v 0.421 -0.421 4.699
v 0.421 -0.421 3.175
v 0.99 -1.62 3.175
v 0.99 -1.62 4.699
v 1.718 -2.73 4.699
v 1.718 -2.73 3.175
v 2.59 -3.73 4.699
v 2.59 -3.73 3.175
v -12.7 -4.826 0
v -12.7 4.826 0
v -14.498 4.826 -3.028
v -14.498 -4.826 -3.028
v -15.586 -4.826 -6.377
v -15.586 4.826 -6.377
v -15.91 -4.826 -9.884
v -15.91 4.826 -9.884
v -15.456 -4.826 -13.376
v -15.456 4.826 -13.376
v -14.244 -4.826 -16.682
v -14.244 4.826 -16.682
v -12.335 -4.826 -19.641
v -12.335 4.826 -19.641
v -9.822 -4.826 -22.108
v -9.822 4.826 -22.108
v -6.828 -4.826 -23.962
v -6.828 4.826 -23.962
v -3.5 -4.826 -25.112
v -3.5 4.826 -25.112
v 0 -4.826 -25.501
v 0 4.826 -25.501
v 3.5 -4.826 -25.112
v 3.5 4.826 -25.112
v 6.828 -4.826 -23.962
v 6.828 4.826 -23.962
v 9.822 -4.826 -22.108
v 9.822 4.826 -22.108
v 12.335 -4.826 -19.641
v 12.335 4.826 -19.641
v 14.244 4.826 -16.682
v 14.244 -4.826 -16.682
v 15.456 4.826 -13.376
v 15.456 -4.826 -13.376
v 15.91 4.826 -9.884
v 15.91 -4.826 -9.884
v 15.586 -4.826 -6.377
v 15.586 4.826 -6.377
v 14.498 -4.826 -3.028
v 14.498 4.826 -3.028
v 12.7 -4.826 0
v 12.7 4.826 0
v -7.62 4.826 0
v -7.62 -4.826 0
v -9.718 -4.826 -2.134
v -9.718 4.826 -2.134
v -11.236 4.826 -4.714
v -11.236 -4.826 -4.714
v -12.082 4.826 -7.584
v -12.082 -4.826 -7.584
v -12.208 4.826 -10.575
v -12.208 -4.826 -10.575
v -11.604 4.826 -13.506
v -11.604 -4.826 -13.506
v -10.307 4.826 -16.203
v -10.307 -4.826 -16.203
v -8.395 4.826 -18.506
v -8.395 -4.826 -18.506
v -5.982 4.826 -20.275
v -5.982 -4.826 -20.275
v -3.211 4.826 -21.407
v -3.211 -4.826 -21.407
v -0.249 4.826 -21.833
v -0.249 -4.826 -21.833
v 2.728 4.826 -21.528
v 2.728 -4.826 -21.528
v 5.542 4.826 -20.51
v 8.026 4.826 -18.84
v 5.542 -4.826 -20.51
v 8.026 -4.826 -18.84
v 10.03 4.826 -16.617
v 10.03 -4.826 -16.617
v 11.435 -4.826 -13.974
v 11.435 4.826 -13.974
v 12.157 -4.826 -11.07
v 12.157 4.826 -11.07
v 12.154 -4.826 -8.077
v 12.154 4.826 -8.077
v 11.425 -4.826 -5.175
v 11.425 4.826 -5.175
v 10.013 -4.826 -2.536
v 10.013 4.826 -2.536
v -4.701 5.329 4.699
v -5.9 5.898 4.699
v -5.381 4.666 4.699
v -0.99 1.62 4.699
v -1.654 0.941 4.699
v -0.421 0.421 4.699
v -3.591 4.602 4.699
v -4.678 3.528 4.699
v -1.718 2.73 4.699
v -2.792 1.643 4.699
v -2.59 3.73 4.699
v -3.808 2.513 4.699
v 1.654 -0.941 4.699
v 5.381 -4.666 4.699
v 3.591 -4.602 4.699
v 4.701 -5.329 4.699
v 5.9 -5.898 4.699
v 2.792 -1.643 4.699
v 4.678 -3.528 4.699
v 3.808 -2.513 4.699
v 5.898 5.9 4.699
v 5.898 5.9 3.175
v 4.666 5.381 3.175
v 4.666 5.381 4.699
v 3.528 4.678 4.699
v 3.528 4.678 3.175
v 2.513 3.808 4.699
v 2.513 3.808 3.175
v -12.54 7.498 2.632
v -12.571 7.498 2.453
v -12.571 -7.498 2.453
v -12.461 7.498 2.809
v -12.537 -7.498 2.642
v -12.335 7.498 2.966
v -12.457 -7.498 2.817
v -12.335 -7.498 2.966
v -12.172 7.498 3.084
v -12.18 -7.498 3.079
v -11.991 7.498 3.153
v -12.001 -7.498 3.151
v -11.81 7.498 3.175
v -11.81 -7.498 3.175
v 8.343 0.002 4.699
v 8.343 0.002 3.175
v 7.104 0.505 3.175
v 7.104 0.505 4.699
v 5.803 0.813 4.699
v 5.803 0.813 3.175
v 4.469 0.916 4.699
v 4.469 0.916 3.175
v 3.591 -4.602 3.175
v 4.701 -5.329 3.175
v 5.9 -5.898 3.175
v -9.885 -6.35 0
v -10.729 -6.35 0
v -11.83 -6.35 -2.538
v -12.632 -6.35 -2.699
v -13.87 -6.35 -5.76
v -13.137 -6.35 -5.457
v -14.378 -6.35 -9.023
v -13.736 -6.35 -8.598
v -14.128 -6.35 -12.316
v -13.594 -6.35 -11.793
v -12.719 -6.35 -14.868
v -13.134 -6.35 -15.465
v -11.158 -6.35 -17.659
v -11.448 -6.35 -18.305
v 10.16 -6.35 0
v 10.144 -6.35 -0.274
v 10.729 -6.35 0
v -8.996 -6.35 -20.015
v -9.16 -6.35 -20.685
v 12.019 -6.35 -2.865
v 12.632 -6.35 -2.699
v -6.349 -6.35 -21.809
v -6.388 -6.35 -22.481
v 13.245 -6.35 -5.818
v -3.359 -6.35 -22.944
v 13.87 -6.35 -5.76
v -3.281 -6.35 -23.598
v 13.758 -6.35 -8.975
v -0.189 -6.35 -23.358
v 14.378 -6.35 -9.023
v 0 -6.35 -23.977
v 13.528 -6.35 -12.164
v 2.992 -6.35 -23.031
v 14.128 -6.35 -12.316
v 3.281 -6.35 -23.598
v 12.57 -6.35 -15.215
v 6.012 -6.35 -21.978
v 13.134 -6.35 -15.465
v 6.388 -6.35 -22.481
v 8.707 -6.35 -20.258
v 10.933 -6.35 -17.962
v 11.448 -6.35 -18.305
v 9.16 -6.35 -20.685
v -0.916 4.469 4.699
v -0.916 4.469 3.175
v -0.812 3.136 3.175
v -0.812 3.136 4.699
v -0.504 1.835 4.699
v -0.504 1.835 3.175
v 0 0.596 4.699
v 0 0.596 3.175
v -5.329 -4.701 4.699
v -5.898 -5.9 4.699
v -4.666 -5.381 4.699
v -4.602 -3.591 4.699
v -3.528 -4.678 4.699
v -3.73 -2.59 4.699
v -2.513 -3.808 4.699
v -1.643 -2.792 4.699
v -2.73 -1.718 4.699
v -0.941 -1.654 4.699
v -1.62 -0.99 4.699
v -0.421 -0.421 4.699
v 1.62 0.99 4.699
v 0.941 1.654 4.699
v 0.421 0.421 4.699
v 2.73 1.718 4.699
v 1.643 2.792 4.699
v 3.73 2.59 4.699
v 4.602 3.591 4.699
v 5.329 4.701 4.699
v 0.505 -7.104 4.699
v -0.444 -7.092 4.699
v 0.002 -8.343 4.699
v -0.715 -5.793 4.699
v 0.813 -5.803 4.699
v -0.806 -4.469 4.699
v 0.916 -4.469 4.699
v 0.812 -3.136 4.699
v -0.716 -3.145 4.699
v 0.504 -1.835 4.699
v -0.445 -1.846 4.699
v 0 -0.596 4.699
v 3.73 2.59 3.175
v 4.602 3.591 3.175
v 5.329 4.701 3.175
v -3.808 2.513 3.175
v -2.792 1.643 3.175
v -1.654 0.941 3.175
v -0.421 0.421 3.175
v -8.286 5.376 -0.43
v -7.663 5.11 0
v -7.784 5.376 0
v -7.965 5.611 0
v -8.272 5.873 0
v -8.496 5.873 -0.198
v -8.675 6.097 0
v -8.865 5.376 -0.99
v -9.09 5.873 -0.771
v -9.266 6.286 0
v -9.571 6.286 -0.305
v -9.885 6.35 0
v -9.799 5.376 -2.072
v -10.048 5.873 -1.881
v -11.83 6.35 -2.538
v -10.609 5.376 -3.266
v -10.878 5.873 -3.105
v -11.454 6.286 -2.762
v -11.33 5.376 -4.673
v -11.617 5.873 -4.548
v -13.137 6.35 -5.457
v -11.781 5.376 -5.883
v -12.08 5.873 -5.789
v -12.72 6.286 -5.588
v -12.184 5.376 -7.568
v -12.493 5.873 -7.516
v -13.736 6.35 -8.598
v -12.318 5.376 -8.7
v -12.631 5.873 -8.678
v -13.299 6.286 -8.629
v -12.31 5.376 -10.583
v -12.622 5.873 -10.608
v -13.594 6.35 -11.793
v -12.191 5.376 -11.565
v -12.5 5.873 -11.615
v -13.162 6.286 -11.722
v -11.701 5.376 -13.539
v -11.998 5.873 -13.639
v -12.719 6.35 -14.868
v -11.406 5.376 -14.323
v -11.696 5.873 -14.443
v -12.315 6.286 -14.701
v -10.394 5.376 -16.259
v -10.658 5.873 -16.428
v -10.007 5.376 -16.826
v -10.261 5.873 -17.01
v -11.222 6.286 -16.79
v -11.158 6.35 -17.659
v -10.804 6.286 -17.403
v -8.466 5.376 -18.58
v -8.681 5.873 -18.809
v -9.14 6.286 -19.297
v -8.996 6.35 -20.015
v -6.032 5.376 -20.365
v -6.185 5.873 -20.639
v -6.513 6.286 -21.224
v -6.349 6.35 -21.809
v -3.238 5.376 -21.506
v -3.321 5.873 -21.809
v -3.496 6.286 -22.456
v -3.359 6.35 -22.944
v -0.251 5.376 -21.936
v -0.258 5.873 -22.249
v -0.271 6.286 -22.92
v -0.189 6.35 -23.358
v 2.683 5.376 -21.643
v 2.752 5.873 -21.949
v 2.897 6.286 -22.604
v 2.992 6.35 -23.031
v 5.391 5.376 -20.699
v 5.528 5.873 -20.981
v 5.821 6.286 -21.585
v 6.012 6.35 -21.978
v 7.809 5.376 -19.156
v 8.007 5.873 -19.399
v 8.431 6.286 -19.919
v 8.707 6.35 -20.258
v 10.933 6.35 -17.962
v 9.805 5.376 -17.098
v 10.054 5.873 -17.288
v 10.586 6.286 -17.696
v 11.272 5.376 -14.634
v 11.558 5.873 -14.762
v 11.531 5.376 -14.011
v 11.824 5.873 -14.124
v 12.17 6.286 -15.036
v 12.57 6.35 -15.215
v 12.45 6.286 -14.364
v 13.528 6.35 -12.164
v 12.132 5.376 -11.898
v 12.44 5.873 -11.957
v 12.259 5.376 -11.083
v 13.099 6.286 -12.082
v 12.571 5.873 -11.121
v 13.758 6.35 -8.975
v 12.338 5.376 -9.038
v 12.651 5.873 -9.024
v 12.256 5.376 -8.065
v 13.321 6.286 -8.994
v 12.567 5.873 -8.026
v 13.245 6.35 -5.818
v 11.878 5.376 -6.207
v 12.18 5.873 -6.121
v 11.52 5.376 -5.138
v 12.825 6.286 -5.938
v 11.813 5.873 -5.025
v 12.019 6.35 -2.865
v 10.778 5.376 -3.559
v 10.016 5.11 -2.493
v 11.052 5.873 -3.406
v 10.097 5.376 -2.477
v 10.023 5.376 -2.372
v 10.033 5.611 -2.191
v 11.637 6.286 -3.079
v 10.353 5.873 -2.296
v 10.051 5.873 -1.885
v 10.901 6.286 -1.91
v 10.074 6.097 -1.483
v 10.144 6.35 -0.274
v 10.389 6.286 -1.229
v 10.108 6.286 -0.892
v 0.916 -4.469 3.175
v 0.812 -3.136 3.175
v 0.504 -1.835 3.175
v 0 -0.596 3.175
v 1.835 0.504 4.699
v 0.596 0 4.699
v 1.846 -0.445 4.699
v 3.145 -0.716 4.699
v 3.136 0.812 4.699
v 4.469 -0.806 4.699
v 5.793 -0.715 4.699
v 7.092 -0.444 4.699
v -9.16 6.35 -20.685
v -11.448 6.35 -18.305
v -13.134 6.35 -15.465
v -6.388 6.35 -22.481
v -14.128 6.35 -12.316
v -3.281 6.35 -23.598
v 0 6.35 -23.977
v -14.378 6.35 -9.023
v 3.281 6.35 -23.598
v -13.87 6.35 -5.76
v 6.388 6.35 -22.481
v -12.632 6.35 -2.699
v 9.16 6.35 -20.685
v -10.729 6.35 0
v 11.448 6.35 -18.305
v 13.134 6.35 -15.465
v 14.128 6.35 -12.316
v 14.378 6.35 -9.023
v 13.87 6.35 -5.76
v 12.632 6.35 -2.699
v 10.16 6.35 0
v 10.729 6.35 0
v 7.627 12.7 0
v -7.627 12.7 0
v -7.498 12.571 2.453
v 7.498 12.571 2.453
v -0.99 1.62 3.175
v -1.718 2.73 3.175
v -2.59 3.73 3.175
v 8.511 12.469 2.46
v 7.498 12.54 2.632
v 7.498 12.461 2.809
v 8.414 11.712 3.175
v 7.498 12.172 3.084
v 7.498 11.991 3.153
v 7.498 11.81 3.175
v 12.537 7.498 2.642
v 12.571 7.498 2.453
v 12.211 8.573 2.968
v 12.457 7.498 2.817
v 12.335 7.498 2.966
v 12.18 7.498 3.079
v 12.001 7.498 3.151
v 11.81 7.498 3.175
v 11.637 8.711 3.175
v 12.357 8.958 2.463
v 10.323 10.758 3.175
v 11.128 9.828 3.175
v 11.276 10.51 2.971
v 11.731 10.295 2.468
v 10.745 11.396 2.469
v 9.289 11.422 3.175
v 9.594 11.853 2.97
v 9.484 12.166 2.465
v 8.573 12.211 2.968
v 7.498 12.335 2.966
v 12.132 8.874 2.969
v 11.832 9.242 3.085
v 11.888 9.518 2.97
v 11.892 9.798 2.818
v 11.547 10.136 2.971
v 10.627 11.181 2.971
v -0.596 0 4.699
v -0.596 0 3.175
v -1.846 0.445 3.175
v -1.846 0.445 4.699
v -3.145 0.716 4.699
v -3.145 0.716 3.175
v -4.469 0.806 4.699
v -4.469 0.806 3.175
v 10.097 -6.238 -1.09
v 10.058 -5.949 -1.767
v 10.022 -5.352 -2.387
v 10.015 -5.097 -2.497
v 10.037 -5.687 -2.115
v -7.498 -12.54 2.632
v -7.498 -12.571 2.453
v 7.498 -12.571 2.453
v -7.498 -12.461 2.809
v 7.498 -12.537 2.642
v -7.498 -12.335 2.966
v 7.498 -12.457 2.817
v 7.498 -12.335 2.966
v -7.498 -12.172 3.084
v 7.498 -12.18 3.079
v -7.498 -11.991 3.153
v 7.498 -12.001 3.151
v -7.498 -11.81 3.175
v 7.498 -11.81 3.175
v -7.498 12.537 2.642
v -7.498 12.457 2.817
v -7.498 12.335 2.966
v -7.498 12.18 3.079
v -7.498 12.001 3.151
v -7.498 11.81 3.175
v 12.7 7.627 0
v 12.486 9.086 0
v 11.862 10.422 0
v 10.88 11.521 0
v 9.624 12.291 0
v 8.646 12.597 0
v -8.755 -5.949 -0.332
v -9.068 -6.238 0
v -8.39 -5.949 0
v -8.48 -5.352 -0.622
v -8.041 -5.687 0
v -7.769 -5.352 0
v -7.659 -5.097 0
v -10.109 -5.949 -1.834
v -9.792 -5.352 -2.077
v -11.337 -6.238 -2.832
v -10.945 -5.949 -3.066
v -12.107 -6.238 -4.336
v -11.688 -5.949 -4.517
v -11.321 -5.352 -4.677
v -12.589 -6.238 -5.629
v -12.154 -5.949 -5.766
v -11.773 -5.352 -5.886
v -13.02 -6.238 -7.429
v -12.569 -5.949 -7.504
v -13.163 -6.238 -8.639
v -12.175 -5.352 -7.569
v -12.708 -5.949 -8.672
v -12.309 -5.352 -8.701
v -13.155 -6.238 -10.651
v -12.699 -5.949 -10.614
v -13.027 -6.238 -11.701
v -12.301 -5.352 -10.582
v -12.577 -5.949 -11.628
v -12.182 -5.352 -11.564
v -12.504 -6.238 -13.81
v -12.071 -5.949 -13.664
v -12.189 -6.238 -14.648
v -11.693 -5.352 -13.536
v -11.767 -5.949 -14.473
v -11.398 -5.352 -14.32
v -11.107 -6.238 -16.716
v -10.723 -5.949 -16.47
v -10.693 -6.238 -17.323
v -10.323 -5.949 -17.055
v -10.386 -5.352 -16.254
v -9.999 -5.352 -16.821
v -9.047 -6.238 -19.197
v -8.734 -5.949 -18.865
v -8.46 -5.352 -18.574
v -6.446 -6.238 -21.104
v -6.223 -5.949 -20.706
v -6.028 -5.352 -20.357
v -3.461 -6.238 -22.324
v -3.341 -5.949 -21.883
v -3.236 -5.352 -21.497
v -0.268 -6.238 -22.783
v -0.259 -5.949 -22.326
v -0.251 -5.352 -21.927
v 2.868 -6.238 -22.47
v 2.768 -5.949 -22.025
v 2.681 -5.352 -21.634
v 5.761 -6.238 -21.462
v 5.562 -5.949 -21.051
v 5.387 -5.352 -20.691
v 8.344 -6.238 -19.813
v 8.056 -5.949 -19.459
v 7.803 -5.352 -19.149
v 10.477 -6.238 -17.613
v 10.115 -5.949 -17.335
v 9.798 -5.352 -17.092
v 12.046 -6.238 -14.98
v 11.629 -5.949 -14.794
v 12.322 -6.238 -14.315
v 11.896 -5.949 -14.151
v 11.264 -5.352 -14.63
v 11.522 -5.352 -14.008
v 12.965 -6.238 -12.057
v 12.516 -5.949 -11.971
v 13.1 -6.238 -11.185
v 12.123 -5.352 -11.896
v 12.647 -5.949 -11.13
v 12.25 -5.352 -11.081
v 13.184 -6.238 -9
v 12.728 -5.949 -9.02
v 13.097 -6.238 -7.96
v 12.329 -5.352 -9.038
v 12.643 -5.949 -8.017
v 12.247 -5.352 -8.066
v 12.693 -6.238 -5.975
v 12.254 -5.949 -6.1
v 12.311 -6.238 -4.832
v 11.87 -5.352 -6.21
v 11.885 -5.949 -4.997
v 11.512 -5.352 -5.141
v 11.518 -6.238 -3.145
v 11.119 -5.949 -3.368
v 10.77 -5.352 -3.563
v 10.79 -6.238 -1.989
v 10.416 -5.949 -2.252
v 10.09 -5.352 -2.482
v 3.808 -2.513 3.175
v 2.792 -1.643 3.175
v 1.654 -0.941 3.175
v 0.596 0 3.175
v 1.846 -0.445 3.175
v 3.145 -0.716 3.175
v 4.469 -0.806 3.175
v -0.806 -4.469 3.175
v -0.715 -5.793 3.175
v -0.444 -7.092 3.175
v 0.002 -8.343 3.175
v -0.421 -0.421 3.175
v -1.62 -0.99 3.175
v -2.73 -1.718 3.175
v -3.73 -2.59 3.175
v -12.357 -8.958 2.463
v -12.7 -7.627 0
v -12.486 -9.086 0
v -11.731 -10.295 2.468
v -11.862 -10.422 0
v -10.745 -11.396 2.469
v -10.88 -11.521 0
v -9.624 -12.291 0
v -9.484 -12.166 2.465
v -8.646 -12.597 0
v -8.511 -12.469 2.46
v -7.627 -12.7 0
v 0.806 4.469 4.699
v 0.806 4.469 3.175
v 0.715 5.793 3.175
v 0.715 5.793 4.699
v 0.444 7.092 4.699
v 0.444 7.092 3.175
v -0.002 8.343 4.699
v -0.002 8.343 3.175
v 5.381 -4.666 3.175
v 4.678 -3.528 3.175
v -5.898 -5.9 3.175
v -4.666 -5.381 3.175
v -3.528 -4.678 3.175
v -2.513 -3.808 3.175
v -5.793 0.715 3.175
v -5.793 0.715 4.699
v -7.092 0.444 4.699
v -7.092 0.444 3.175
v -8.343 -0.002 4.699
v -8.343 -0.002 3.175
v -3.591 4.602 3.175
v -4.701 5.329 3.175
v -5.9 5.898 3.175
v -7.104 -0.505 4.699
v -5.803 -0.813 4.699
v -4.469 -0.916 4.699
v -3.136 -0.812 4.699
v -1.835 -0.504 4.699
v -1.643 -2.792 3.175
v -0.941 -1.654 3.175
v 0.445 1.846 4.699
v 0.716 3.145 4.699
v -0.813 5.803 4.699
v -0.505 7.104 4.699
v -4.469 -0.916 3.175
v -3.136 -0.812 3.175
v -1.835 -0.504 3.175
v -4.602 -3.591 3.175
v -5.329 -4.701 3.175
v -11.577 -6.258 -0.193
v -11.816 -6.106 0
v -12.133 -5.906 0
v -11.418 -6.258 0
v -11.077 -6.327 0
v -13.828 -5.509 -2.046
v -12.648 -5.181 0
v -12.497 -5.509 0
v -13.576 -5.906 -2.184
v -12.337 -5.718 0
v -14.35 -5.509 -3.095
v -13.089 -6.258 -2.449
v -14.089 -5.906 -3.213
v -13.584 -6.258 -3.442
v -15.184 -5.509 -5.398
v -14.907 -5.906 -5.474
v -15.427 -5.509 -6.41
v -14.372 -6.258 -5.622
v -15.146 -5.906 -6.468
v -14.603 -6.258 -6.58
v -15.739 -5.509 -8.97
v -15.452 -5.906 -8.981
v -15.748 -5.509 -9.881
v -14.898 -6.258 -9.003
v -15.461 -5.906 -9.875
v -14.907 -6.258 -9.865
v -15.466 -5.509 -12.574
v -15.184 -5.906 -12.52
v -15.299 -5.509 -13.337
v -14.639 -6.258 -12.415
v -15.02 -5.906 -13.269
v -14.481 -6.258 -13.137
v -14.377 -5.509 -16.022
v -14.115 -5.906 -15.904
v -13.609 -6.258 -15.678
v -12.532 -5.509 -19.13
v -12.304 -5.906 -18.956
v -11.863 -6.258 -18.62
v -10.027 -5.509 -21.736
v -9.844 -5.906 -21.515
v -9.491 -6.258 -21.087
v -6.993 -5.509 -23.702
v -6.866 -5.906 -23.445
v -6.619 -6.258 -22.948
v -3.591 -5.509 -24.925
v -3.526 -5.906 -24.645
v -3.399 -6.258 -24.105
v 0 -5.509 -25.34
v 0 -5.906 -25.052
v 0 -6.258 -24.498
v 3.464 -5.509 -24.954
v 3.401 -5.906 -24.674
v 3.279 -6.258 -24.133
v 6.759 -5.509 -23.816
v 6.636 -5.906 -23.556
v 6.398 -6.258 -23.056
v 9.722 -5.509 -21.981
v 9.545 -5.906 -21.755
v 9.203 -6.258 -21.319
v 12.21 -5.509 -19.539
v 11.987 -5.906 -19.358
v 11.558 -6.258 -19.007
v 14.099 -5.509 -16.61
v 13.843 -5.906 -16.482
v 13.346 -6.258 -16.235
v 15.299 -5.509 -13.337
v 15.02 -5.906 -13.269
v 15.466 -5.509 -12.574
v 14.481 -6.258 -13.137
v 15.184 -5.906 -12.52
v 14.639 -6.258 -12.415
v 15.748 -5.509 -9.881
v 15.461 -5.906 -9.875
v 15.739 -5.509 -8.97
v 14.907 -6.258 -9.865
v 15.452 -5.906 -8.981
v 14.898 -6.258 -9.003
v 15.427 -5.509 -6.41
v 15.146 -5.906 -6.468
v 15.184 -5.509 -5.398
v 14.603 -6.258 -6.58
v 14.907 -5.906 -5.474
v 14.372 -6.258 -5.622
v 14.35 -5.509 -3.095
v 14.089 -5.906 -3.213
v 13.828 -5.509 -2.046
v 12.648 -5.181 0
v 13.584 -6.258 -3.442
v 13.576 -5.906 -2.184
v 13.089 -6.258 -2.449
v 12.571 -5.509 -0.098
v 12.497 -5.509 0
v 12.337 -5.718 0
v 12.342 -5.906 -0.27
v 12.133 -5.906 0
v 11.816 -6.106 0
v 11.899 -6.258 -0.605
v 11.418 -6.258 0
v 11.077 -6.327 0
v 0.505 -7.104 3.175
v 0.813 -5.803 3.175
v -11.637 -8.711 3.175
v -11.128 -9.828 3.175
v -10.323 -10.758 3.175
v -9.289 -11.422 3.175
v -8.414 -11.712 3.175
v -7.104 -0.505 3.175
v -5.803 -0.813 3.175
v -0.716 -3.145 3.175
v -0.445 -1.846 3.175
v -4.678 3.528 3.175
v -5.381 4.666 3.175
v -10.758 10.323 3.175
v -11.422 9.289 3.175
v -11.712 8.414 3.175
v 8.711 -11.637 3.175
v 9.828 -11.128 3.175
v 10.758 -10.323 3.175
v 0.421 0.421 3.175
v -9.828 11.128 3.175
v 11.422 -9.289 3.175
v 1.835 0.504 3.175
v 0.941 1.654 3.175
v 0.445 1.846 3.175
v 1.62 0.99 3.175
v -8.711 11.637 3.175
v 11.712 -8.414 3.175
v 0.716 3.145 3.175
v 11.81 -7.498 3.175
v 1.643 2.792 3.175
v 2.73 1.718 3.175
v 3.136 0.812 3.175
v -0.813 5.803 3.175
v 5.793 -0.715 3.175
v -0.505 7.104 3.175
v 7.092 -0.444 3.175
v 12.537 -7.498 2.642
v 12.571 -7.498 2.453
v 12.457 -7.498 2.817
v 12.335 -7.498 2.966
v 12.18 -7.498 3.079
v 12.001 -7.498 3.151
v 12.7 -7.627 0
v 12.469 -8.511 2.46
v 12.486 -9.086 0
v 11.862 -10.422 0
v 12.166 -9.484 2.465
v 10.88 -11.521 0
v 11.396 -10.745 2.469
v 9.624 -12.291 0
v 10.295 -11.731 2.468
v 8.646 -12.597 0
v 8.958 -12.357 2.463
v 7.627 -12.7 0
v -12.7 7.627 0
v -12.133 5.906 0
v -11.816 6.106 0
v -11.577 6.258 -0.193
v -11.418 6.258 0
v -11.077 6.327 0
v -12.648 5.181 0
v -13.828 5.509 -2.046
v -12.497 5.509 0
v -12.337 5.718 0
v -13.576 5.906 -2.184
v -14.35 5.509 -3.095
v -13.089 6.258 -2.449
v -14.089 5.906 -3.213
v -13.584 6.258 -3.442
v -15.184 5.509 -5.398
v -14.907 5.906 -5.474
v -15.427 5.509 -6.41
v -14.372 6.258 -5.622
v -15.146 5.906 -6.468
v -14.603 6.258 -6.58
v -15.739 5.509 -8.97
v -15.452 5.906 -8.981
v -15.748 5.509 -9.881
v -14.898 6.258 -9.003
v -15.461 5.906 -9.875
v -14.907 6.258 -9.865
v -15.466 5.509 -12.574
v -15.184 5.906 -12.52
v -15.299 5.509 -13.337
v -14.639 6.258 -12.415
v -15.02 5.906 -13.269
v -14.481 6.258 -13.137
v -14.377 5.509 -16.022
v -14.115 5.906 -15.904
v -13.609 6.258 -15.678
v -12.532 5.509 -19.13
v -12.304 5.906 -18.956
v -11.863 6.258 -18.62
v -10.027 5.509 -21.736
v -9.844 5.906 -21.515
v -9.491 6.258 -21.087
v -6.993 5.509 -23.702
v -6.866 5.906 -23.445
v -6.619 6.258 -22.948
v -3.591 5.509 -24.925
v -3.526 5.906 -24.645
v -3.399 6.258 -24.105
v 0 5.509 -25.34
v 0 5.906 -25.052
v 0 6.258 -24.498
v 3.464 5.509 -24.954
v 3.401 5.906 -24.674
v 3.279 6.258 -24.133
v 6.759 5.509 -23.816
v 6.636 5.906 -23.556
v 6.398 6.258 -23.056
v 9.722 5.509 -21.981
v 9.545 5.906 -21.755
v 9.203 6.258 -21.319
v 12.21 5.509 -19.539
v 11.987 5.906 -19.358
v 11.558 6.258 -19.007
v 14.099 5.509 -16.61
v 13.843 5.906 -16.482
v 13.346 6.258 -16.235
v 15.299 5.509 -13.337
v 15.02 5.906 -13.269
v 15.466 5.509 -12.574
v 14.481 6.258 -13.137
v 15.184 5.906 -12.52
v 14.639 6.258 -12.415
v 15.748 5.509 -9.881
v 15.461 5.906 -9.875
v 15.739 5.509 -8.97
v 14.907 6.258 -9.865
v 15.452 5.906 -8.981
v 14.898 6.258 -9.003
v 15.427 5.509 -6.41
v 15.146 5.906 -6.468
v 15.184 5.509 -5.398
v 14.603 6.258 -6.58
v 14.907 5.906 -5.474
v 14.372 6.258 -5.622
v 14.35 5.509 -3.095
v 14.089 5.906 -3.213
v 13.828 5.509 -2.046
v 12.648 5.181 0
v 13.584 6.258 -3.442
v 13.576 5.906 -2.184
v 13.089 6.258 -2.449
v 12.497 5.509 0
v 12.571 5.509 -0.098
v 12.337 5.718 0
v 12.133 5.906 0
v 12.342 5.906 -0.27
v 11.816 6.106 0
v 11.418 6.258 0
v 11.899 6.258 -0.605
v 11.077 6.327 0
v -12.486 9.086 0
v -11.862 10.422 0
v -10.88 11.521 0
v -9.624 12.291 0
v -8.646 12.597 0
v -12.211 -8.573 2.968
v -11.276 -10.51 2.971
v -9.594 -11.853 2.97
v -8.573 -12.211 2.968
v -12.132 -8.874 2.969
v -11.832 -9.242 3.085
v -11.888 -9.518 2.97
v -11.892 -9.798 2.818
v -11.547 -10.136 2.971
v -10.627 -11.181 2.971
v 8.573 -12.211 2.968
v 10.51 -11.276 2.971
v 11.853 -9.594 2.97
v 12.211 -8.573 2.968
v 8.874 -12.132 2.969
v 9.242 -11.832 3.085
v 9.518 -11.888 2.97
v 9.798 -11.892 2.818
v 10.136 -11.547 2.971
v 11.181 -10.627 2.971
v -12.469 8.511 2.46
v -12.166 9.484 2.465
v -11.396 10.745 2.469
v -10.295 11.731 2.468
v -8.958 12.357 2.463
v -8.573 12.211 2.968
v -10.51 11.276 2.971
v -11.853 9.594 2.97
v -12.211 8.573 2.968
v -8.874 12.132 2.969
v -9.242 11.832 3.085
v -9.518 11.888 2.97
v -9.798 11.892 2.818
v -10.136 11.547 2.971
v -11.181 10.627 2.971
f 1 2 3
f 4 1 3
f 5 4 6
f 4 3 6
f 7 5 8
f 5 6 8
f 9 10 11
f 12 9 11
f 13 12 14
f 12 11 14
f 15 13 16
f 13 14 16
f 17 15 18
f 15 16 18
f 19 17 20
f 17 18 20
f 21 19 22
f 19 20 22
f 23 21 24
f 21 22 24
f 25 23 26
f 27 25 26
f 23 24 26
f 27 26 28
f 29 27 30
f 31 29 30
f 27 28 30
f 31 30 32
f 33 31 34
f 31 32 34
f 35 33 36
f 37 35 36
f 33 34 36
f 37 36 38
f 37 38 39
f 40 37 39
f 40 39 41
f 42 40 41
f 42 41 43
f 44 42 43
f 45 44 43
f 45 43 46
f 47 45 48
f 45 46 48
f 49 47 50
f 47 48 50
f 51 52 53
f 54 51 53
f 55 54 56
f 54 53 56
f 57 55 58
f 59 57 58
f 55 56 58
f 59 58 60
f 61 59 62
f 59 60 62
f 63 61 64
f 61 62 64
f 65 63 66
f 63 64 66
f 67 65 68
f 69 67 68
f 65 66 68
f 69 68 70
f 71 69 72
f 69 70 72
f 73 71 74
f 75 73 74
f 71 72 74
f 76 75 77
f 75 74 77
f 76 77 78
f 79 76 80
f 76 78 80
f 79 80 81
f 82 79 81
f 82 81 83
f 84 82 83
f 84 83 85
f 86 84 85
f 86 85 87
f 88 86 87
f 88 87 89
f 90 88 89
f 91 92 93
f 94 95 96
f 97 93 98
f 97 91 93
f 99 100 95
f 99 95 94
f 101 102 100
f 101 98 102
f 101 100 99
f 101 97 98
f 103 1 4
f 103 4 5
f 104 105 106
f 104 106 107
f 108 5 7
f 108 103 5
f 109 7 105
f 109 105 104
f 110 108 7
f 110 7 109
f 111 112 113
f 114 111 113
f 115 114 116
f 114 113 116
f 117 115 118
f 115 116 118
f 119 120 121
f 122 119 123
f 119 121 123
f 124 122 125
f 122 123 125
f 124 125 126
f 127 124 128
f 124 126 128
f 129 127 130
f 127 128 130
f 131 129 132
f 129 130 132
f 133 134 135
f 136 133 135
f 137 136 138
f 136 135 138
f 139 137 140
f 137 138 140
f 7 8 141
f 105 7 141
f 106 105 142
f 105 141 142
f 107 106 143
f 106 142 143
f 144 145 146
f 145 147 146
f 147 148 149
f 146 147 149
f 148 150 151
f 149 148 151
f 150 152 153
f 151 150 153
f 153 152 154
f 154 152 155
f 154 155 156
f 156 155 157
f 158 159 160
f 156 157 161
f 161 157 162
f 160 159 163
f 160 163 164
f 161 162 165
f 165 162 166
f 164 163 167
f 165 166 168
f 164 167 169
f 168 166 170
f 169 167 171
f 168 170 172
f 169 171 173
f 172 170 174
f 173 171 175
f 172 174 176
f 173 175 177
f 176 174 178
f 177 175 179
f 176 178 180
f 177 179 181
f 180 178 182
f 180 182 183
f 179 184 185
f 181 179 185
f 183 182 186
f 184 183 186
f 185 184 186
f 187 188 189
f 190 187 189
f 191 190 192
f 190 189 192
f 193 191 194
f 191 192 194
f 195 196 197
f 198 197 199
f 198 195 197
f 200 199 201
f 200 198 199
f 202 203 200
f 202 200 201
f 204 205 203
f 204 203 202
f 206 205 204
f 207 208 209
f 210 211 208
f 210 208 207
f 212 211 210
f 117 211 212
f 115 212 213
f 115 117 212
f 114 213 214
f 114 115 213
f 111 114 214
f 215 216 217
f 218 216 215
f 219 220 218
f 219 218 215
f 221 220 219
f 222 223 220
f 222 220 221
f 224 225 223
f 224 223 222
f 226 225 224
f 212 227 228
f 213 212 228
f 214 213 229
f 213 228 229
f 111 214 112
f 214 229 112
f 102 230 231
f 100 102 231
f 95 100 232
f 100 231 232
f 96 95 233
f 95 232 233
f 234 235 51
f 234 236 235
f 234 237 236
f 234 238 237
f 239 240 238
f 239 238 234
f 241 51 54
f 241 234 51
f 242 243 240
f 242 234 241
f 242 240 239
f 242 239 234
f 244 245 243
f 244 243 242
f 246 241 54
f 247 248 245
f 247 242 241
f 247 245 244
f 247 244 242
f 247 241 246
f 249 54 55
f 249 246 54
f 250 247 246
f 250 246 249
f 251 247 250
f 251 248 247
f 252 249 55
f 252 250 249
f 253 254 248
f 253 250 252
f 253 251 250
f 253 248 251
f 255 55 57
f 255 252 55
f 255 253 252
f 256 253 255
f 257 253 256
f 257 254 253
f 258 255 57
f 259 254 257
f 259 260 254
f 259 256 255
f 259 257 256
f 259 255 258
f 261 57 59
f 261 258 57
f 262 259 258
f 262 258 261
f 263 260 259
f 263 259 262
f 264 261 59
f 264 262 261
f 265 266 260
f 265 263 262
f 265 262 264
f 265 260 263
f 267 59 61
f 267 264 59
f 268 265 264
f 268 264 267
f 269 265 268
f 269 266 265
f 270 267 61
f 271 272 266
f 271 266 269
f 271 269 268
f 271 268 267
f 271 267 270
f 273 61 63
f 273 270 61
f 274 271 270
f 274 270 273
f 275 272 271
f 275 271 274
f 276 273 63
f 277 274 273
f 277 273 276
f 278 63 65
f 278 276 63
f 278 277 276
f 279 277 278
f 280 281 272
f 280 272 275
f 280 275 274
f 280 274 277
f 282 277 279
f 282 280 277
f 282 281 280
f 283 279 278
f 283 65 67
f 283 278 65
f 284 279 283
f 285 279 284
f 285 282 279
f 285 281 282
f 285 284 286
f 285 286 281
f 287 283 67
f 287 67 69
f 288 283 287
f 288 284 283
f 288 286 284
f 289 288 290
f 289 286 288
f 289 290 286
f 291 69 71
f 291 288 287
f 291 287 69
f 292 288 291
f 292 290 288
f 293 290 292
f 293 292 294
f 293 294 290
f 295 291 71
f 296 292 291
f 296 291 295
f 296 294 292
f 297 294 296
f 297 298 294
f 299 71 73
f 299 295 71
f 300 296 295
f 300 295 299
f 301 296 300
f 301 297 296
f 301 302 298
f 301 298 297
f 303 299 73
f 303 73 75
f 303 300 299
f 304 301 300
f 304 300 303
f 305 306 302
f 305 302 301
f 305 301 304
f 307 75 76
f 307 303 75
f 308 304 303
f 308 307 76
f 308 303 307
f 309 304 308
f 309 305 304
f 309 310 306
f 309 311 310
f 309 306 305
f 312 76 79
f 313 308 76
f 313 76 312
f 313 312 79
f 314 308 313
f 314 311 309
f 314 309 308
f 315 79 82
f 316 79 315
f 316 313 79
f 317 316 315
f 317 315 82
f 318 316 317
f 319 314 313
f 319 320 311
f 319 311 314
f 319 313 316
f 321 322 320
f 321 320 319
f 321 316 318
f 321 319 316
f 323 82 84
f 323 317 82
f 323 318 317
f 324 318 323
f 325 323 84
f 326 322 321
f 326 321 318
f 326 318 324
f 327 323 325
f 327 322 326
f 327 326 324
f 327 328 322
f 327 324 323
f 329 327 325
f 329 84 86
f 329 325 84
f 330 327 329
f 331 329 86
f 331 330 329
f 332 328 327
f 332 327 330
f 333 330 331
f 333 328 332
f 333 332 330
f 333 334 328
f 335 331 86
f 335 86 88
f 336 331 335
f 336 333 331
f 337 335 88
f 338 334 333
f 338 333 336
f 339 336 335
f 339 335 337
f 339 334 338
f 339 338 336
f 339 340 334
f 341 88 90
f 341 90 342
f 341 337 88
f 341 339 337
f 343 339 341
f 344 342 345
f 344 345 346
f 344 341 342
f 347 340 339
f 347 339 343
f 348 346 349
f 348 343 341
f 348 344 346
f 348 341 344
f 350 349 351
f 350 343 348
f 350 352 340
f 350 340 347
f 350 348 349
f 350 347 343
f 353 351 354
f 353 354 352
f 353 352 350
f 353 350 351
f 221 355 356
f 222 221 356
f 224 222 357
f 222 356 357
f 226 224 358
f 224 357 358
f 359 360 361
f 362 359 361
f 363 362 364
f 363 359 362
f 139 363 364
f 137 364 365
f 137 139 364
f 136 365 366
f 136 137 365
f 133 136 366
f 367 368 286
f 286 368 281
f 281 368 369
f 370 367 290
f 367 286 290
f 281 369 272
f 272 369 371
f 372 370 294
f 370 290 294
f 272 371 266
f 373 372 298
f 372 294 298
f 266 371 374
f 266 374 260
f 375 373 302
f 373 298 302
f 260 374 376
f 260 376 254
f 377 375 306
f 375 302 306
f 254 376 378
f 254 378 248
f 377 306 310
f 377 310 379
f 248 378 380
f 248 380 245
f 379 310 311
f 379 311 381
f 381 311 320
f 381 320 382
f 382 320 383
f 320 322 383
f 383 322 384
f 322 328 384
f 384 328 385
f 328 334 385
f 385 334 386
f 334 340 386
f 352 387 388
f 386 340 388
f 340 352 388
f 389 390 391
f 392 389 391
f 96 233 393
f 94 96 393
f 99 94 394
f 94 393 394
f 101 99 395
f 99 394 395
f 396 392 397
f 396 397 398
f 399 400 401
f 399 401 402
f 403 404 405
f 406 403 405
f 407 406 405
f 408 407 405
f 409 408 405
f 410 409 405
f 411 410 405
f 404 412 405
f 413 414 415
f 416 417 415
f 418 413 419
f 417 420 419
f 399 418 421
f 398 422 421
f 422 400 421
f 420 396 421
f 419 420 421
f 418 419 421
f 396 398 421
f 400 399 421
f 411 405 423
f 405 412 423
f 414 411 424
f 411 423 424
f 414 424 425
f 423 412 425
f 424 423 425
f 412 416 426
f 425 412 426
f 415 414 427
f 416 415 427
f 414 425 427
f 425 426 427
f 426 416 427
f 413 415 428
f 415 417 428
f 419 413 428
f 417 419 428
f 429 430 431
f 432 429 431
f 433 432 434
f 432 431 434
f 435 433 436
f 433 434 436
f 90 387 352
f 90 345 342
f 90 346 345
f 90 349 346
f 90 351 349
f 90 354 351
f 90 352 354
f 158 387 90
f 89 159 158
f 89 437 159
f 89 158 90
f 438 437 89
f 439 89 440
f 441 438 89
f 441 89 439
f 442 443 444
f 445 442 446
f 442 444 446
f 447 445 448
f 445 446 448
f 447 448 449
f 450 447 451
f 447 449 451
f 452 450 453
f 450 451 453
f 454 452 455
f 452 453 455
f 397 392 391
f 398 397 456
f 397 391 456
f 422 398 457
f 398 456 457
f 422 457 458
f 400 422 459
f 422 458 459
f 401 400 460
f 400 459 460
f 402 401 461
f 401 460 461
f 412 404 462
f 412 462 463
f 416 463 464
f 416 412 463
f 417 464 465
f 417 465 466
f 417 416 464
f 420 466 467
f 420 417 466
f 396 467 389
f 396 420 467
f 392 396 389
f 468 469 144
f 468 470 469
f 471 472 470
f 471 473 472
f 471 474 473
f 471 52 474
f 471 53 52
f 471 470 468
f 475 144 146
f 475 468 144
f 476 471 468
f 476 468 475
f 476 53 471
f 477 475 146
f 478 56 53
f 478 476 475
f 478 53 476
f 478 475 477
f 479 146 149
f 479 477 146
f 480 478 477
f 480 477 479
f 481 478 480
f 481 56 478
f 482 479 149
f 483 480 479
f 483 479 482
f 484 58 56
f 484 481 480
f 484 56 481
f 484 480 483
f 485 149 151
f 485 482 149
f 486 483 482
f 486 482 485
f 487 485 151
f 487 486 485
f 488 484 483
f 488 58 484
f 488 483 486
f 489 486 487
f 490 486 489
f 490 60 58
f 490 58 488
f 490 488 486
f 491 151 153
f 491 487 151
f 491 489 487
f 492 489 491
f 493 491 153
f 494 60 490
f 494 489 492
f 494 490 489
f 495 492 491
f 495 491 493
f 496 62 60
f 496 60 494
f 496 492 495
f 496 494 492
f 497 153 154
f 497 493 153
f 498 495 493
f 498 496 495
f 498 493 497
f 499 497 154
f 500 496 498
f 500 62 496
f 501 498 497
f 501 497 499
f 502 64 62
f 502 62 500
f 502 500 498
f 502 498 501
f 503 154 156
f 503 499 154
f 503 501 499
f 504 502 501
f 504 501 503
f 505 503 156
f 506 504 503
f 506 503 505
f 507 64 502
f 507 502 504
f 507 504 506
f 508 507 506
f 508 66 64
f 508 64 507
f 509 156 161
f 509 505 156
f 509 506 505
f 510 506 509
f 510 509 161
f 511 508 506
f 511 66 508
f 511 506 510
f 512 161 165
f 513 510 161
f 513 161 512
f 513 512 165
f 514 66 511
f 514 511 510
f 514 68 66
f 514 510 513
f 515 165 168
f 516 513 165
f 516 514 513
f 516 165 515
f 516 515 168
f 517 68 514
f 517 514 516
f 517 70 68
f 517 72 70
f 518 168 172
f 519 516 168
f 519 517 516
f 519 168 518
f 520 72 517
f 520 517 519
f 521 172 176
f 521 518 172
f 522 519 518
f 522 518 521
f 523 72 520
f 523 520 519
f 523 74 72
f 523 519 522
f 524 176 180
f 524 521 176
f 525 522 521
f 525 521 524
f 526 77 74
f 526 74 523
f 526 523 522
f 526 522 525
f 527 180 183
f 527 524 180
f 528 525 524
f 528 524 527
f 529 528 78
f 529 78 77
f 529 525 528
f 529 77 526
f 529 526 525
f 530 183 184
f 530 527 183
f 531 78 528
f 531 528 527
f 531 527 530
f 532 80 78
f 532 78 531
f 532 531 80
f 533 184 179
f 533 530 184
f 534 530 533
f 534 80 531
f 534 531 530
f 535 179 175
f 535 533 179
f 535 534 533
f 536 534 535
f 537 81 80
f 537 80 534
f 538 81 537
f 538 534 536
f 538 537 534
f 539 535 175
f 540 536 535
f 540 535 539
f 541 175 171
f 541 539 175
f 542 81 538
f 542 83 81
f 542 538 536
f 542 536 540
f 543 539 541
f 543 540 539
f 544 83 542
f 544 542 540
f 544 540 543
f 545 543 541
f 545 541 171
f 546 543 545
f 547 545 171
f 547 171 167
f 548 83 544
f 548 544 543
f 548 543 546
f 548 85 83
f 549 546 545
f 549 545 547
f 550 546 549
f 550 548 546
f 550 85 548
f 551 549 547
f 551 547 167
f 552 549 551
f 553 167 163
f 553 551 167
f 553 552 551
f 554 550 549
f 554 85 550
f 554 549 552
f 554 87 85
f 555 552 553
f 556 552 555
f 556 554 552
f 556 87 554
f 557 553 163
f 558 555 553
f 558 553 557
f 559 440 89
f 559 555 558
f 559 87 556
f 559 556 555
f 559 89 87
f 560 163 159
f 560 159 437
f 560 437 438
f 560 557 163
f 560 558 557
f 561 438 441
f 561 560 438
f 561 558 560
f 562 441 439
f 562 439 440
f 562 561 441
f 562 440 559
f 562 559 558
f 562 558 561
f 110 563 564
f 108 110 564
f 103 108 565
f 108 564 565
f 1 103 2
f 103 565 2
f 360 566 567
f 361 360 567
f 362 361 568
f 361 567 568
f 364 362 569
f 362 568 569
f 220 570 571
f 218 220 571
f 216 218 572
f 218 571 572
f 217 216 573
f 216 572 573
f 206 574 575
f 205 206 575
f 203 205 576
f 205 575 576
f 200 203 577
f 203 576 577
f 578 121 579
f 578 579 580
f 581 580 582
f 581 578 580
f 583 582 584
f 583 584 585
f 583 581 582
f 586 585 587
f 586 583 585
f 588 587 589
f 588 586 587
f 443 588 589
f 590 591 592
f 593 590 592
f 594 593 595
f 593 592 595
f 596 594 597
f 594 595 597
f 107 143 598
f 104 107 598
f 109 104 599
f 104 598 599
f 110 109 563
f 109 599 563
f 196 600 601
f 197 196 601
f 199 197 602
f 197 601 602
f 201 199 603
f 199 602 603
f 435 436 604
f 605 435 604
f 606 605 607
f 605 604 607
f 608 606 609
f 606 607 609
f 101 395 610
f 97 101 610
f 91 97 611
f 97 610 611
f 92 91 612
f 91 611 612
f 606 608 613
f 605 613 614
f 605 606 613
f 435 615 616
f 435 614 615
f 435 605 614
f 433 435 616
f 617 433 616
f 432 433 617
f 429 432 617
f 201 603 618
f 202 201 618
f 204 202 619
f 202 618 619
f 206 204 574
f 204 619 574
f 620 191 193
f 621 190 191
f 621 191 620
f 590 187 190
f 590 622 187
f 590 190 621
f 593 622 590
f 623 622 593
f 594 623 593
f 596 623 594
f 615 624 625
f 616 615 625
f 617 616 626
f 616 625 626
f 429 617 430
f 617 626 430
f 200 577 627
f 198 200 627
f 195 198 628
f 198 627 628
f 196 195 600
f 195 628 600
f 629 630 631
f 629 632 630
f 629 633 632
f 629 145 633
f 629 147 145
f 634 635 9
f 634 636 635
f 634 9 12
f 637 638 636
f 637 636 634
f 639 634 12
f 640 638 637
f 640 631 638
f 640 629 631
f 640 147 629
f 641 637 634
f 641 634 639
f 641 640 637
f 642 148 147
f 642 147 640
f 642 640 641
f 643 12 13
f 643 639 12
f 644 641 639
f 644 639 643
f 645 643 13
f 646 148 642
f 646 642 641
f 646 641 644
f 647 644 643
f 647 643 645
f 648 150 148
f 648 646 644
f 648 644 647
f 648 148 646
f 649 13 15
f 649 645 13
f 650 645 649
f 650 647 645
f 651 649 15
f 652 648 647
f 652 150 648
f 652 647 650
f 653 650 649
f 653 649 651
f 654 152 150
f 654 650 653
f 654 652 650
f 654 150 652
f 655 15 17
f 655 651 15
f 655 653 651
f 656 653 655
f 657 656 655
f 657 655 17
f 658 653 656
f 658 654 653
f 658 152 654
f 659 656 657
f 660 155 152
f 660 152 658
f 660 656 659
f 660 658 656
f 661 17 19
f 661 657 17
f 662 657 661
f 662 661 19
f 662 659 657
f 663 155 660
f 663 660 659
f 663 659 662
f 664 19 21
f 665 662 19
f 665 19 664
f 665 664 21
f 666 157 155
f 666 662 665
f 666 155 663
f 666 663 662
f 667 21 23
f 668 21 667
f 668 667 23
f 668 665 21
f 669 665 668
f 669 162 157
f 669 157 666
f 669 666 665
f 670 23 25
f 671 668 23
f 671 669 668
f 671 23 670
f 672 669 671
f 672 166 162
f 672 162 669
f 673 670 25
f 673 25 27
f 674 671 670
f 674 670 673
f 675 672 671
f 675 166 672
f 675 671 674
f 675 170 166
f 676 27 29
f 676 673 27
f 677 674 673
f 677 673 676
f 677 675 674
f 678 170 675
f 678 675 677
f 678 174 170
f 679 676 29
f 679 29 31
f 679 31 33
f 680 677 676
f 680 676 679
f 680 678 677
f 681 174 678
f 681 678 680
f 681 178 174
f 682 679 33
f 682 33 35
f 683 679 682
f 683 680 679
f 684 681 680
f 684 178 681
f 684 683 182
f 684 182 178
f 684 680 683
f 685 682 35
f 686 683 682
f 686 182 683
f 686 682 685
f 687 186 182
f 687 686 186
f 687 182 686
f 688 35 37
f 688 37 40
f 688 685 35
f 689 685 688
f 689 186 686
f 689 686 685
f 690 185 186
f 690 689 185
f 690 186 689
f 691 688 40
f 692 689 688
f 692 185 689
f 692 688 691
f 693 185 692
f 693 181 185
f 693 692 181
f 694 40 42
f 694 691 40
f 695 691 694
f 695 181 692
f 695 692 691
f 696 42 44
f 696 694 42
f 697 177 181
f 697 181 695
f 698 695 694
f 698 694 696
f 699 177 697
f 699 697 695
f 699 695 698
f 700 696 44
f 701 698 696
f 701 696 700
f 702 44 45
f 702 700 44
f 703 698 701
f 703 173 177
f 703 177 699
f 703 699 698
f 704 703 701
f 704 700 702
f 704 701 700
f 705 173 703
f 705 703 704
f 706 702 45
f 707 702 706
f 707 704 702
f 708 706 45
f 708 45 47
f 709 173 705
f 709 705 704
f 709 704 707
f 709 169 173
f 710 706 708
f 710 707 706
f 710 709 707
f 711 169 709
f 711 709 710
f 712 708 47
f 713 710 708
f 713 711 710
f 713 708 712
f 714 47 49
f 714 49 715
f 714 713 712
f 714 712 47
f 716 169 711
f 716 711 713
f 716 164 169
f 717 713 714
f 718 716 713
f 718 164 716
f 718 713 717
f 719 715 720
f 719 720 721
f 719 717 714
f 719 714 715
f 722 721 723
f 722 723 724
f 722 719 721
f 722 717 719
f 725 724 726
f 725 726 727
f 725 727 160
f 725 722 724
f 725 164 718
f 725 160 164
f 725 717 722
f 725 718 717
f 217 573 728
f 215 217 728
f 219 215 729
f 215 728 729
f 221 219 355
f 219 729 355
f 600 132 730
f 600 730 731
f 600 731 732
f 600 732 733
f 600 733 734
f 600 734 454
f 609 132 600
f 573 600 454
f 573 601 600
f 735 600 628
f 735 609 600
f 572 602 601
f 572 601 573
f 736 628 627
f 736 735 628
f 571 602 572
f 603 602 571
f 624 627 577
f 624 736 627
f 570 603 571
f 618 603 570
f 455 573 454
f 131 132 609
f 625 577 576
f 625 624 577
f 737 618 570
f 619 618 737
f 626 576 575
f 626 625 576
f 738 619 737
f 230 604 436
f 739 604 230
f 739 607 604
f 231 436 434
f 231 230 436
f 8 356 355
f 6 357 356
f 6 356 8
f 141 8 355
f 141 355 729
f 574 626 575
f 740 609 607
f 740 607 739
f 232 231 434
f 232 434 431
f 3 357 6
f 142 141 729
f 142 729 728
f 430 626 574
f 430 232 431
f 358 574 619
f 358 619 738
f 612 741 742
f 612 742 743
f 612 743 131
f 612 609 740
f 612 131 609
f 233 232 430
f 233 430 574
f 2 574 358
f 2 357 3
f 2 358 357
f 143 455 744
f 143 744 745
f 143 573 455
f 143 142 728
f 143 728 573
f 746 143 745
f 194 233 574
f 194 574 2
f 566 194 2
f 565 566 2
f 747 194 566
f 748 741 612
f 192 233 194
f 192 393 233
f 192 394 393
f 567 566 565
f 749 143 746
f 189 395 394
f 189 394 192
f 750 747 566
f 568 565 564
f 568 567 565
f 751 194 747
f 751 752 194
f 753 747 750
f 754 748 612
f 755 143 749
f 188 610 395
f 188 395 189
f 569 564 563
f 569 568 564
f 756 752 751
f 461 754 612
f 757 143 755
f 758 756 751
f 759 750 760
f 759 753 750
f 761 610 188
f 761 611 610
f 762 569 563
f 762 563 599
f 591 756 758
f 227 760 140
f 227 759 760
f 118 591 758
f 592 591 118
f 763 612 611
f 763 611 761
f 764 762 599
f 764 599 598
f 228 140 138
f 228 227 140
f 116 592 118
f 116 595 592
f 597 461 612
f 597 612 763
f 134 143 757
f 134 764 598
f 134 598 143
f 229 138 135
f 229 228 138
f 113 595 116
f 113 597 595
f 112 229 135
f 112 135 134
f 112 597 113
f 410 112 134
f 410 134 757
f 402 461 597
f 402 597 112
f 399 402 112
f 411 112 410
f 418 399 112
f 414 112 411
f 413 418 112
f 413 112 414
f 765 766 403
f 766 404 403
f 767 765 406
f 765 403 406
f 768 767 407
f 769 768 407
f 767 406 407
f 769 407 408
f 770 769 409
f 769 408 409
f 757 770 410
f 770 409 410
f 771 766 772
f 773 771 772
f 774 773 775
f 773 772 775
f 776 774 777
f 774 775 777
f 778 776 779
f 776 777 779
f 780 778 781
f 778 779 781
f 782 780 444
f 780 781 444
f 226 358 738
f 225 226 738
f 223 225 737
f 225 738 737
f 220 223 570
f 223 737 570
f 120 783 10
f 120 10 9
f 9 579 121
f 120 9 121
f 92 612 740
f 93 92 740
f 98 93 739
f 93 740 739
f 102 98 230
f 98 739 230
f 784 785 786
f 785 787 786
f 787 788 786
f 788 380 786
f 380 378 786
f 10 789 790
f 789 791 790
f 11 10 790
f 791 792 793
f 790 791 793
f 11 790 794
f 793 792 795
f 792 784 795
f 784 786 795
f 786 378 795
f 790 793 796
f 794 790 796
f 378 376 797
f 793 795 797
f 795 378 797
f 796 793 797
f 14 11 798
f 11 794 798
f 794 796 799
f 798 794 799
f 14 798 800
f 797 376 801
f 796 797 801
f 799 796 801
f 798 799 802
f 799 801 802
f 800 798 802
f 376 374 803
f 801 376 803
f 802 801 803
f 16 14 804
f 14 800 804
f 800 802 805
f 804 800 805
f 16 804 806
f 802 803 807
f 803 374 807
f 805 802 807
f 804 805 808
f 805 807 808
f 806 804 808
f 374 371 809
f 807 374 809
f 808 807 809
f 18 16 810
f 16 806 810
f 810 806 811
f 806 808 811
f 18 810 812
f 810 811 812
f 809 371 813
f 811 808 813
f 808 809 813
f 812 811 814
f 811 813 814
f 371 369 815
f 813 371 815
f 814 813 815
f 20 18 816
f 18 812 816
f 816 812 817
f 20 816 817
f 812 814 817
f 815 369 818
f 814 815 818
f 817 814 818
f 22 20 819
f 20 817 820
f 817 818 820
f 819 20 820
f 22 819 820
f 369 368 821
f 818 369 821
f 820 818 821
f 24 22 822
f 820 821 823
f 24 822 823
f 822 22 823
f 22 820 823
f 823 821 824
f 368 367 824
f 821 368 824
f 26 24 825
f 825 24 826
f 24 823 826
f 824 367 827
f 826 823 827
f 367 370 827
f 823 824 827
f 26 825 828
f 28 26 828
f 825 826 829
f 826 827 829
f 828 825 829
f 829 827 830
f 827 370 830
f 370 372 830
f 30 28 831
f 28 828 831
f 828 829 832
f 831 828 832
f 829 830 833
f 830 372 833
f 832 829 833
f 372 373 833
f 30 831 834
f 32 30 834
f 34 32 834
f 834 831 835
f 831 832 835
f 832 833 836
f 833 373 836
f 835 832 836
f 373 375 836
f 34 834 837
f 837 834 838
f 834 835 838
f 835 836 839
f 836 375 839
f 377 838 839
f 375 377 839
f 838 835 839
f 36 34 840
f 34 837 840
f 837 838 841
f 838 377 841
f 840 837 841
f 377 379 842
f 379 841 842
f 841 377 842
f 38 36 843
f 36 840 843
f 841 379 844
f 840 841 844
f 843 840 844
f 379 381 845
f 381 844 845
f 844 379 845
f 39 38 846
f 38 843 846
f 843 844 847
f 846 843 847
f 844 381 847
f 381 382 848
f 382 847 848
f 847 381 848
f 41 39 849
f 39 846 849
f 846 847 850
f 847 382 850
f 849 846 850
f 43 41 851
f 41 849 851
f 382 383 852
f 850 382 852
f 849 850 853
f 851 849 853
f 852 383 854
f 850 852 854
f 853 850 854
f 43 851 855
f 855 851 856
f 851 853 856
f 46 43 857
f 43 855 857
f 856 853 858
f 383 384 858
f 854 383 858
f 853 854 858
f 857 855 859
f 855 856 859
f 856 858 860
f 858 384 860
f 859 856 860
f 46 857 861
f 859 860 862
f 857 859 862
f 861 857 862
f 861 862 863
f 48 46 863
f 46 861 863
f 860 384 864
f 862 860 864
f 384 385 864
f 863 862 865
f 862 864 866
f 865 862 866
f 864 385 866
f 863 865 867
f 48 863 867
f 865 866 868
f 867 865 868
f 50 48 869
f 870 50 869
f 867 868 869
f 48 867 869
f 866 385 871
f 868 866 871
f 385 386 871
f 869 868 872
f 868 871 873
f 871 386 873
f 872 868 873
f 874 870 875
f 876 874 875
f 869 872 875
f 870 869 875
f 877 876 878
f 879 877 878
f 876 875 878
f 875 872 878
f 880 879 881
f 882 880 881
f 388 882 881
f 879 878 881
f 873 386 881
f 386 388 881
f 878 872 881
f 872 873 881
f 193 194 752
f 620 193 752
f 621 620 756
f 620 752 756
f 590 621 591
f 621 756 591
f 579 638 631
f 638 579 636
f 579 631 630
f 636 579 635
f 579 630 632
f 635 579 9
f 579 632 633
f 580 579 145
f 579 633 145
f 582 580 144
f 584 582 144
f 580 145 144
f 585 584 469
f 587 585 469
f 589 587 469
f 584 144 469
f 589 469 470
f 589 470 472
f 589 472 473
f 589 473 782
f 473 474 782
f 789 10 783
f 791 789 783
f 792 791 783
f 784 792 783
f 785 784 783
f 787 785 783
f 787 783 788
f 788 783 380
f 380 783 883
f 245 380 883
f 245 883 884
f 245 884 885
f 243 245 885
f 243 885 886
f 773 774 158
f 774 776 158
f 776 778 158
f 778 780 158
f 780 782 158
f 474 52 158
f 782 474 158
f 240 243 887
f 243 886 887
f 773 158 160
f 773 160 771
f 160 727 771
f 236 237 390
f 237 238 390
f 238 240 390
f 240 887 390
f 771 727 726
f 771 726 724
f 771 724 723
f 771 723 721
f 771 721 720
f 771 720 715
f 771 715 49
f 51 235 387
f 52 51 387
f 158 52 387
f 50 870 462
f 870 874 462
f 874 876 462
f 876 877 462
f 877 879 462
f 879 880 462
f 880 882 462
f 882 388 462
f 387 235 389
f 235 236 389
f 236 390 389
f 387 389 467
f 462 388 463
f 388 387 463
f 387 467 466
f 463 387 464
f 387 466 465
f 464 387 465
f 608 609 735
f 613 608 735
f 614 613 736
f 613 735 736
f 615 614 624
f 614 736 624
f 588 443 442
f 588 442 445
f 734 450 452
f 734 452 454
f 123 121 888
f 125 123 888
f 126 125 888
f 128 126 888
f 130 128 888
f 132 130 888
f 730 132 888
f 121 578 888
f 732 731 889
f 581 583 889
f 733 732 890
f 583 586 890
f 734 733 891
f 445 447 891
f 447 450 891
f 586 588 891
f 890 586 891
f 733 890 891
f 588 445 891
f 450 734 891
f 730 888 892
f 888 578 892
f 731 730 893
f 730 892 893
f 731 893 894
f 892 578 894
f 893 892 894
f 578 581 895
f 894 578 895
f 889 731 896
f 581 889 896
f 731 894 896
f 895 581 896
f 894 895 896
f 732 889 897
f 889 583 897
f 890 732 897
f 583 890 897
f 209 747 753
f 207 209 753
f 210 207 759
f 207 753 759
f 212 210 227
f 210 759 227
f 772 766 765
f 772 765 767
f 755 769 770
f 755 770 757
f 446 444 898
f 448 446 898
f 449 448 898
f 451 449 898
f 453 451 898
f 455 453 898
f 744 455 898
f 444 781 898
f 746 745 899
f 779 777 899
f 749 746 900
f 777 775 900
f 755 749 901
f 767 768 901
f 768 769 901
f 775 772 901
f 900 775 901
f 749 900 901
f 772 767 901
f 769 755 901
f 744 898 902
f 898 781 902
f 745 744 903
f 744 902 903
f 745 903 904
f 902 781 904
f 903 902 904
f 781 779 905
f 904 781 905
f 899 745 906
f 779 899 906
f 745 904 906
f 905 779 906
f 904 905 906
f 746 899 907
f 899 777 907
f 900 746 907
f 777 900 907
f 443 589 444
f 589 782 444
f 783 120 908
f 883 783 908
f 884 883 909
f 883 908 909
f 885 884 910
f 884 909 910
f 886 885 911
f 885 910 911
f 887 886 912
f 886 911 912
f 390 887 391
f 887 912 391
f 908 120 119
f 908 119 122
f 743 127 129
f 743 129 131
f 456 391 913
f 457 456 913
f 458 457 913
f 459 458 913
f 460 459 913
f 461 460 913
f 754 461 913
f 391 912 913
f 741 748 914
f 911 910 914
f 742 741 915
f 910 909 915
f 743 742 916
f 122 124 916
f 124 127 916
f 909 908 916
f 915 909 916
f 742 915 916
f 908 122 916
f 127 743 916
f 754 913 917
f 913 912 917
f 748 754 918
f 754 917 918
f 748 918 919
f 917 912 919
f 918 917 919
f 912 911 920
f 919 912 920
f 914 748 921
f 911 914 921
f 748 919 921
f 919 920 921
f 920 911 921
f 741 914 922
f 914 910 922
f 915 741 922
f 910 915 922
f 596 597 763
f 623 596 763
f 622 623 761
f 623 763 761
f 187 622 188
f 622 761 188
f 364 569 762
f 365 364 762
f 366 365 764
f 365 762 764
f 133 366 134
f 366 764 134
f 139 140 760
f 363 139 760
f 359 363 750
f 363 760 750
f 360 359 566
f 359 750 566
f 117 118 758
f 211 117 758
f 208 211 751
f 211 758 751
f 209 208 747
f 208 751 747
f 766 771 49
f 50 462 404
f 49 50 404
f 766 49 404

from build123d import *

# Parameters (mm, degrees)
F0_W      = 25.4
F0_H      = 25.4
F1_DEPTH  = 3.175
F1_TAPER  = 3
F3_W      = 5.08
F3_H      = 12.7
F6_R      = 5.08
F7_R      = 1.524
F8_R      = 0.762
F10_DEPTH = 1.524


# Not quite as in the source:
# - ends of sketch curves that miss each other by under 0.0002 mm in the source are joined


with BuildPart() as f1:
    # F0 (on Top) → F1 (new body)
    with BuildSketch(Plane.XY):
        Rectangle(F0_W, F0_H)
    extrude(amount=F1_DEPTH, taper=F1_TAPER)

    # F4: sweep along a path in F2
    with BuildLine(Plane.XZ) as f4_path:
        ThreePointArc((-10.16, 0), (0, -23.5582897328), (10.16, 0))
    # F3 (on face) → F4 (sweep)
    with BuildSketch(Plane(origin=(0, 0, 0), x_dir=(1, 0, 0), z_dir=(0, 0, -1))):
        with Locations((-10.16, 0)):
            Rectangle(F3_W, F3_H)
    sweep(path=f4_path.line)

    # F6
    f6_edges = [f1.edges().sort_by_distance(p)[0] for p in [
        (-12.616803, 12.616803, 1.5875),
        (-12.616803, -12.616803, 1.5875),
        (12.616803, -12.616803, 1.5875),
        (12.616803, 12.616803, 1.5875),
    ]]
    fillet(f6_edges, radius=F6_R)

    # F7
    f7_edges = [f1.edges().sort_by_distance(p)[0] for p in [
        (0, -6.35, -25.501344),
        (-1.743325, -6.35, -21.711017),
        (-1.743325, 6.35, -21.711017),
        (0, 6.35, -25.501344),
    ]]
    fillet(f7_edges, radius=F7_R)

    # F8
    f8_edges = [f1.edges().sort_by_distance(p)[0] for p in [
        (12.533605, 0, 3.175),
        (11.048589, -11.048589, 3.175),
        (11.048589, 11.048589, 3.175),
        (0, -12.533605, 3.175),
        (0, 12.533605, 3.175),
        (-11.048589, -11.048589, 3.175),
        (-11.048589, 11.048589, 3.175),
        (-12.533605, 0, 3.175),
    ]]
    fillet(f8_edges, radius=F8_R)

    # F9 (on face) → F10 (join)
    with BuildSketch(Plane.XY.offset(3.175)):
        with BuildLine():
            ThreePointArc((-3.8077433876, 2.5129958106), (-2.2363648369, 1.2700255802), (-0.4214138117, 0.4214041575))
            ThreePointArc((-0.4214138117, 0.4214041575), (-1.3351477858, 2.1876037686), (-2.5900078566, 3.7302233456))
            ThreePointArc((-2.5900078566, 3.7302233456), (-4.1334248315, 4.984630209), (-5.9002408115, 5.8978835339))
            ThreePointArc((-5.9002408115, 5.8978835339), (-5.0511449244, 4.0835594737), (-3.8077433876, 2.5129958106))
        make_face()
        with BuildLine():
            ThreePointArc((-0.9155427616, 4.4694347941), (-0.6833212656, 2.4793847644), (-1.9106e-05, 0.5959506396))
            ThreePointArc((-1.9106e-05, 0.5959506396), (0.6027711391, 2.4909604876), (0.8062465423, 4.4690791999))
            ThreePointArc((0.8062465423, 4.4690791999), (0.6018941572, 6.4474337167), (-0.0016602711, 8.3425243592))
            ThreePointArc((-0.0016602711, 8.3425243592), (-0.6841876238, 6.4592135153), (-0.9155427616, 4.4694347941))
        make_face()
        with BuildLine():
            ThreePointArc((2.5129831047, 3.8077560876), (1.2700048982, 2.2363724755), (0.4213787575, 0.4214138117))
            ThreePointArc((0.4213787575, 0.4214138117), (2.1875938836, 1.3351413072), (3.7302233456, 2.5900078566))
            ThreePointArc((3.7302233456, 2.5900078566), (4.984630209, 4.1334248315), (5.8978835339, 5.9002408115))
            ThreePointArc((5.8978835339, 5.9002408115), (4.0835594737, 5.0511449244), (2.5129831047, 3.8077560876))
        make_face()
        with BuildLine():
            ThreePointArc((4.4694347941, 0.9155427616), (2.4793737115, 0.6833186532), (0.5959303259, 8.9412e-06))
            ThreePointArc((0.5959303259, 8.9412e-06), (2.4909366547, -0.6027661778), (4.4690537999, -0.8062465482))
            ThreePointArc((4.4690537999, -0.8062465482), (6.4474197136, -0.6018917801), (8.3425203043, 0.0016695744))
            ThreePointArc((8.3425203043, 0.0016695744), (6.4592115314, 0.6841820987), (4.4694347941, 0.9155427616))
        make_face()
        with BuildLine():
            ThreePointArc((3.8077560876, -2.5129831047), (2.2363622238, -1.2699985662), (0.4213909469, -0.4213711439))
            ThreePointArc((0.4213909469, -0.4213711439), (1.3351159072, -2.1875938836), (2.5899824566, -3.7302233456))
            ThreePointArc((2.5899824566, -3.7302233456), (4.1334074282, -4.9846188126), (5.9002188082, -5.8978748887))
            ThreePointArc((5.9002188082, -5.8978748887), (5.0511428128, -4.0835560578), (3.8077560876, -2.5129831047))
        make_face()
        with BuildLine():
            ThreePointArc((0.9155173616, -4.4694348001), (0.6832945611, -2.4793792452), (-1.13725e-05, -0.5959404907))
            ThreePointArc((-1.13725e-05, -0.5959404907), (-0.6027905445, -2.4909316905), (-0.8062719482, -4.4690537999))
            ThreePointArc((-0.8062719482, -4.4690537999), (-0.601916144, -6.447424681), (0.0016482293, -8.3425296076))
            ThreePointArc((0.0016482293, -8.3425296076), (0.6841820987, -6.4592115314), (0.9155173616, -4.4694348001))
        make_face()
        with BuildLine():
            ThreePointArc((-2.5129958106, -3.8077433876), (-1.2700192482, -2.2363545852), (-0.4213965439, -0.4213909469))
            ThreePointArc((-0.4213965439, -0.4213909469), (-2.1876037686, -1.3351223858), (-3.7302233456, -2.5899824566))
            ThreePointArc((-3.7302233456, -2.5899824566), (-4.9846188126, -4.1334074282), (-5.8978748887, -5.9002188082))
            ThreePointArc((-5.8978748887, -5.9002188082), (-4.0835560578, -5.0511428128), (-2.5129958106, -3.8077433876))
        make_face()
        with BuildLine():
            ThreePointArc((-4.4694348001, -0.9155173616), (-2.4793902981, -0.6832971735), (-0.5959608043, 1.2077e-06))
            ThreePointArc((-0.5959608043, 1.2077e-06), (-2.4909555235, 0.6027955057), (-4.4690791999, 0.8062719423))
            ThreePointArc((-4.4690791999, 0.8062719423), (-6.4474386841, 0.6019185211), (-8.3425336625, -0.0016389259))
            ThreePointArc((-8.3425336625, -0.0016389259), (-6.4592135153, -0.6841876238), (-4.4694348001, -0.9155173616))
        make_face()
    extrude(amount=F10_DEPTH)


solid = f1.part
